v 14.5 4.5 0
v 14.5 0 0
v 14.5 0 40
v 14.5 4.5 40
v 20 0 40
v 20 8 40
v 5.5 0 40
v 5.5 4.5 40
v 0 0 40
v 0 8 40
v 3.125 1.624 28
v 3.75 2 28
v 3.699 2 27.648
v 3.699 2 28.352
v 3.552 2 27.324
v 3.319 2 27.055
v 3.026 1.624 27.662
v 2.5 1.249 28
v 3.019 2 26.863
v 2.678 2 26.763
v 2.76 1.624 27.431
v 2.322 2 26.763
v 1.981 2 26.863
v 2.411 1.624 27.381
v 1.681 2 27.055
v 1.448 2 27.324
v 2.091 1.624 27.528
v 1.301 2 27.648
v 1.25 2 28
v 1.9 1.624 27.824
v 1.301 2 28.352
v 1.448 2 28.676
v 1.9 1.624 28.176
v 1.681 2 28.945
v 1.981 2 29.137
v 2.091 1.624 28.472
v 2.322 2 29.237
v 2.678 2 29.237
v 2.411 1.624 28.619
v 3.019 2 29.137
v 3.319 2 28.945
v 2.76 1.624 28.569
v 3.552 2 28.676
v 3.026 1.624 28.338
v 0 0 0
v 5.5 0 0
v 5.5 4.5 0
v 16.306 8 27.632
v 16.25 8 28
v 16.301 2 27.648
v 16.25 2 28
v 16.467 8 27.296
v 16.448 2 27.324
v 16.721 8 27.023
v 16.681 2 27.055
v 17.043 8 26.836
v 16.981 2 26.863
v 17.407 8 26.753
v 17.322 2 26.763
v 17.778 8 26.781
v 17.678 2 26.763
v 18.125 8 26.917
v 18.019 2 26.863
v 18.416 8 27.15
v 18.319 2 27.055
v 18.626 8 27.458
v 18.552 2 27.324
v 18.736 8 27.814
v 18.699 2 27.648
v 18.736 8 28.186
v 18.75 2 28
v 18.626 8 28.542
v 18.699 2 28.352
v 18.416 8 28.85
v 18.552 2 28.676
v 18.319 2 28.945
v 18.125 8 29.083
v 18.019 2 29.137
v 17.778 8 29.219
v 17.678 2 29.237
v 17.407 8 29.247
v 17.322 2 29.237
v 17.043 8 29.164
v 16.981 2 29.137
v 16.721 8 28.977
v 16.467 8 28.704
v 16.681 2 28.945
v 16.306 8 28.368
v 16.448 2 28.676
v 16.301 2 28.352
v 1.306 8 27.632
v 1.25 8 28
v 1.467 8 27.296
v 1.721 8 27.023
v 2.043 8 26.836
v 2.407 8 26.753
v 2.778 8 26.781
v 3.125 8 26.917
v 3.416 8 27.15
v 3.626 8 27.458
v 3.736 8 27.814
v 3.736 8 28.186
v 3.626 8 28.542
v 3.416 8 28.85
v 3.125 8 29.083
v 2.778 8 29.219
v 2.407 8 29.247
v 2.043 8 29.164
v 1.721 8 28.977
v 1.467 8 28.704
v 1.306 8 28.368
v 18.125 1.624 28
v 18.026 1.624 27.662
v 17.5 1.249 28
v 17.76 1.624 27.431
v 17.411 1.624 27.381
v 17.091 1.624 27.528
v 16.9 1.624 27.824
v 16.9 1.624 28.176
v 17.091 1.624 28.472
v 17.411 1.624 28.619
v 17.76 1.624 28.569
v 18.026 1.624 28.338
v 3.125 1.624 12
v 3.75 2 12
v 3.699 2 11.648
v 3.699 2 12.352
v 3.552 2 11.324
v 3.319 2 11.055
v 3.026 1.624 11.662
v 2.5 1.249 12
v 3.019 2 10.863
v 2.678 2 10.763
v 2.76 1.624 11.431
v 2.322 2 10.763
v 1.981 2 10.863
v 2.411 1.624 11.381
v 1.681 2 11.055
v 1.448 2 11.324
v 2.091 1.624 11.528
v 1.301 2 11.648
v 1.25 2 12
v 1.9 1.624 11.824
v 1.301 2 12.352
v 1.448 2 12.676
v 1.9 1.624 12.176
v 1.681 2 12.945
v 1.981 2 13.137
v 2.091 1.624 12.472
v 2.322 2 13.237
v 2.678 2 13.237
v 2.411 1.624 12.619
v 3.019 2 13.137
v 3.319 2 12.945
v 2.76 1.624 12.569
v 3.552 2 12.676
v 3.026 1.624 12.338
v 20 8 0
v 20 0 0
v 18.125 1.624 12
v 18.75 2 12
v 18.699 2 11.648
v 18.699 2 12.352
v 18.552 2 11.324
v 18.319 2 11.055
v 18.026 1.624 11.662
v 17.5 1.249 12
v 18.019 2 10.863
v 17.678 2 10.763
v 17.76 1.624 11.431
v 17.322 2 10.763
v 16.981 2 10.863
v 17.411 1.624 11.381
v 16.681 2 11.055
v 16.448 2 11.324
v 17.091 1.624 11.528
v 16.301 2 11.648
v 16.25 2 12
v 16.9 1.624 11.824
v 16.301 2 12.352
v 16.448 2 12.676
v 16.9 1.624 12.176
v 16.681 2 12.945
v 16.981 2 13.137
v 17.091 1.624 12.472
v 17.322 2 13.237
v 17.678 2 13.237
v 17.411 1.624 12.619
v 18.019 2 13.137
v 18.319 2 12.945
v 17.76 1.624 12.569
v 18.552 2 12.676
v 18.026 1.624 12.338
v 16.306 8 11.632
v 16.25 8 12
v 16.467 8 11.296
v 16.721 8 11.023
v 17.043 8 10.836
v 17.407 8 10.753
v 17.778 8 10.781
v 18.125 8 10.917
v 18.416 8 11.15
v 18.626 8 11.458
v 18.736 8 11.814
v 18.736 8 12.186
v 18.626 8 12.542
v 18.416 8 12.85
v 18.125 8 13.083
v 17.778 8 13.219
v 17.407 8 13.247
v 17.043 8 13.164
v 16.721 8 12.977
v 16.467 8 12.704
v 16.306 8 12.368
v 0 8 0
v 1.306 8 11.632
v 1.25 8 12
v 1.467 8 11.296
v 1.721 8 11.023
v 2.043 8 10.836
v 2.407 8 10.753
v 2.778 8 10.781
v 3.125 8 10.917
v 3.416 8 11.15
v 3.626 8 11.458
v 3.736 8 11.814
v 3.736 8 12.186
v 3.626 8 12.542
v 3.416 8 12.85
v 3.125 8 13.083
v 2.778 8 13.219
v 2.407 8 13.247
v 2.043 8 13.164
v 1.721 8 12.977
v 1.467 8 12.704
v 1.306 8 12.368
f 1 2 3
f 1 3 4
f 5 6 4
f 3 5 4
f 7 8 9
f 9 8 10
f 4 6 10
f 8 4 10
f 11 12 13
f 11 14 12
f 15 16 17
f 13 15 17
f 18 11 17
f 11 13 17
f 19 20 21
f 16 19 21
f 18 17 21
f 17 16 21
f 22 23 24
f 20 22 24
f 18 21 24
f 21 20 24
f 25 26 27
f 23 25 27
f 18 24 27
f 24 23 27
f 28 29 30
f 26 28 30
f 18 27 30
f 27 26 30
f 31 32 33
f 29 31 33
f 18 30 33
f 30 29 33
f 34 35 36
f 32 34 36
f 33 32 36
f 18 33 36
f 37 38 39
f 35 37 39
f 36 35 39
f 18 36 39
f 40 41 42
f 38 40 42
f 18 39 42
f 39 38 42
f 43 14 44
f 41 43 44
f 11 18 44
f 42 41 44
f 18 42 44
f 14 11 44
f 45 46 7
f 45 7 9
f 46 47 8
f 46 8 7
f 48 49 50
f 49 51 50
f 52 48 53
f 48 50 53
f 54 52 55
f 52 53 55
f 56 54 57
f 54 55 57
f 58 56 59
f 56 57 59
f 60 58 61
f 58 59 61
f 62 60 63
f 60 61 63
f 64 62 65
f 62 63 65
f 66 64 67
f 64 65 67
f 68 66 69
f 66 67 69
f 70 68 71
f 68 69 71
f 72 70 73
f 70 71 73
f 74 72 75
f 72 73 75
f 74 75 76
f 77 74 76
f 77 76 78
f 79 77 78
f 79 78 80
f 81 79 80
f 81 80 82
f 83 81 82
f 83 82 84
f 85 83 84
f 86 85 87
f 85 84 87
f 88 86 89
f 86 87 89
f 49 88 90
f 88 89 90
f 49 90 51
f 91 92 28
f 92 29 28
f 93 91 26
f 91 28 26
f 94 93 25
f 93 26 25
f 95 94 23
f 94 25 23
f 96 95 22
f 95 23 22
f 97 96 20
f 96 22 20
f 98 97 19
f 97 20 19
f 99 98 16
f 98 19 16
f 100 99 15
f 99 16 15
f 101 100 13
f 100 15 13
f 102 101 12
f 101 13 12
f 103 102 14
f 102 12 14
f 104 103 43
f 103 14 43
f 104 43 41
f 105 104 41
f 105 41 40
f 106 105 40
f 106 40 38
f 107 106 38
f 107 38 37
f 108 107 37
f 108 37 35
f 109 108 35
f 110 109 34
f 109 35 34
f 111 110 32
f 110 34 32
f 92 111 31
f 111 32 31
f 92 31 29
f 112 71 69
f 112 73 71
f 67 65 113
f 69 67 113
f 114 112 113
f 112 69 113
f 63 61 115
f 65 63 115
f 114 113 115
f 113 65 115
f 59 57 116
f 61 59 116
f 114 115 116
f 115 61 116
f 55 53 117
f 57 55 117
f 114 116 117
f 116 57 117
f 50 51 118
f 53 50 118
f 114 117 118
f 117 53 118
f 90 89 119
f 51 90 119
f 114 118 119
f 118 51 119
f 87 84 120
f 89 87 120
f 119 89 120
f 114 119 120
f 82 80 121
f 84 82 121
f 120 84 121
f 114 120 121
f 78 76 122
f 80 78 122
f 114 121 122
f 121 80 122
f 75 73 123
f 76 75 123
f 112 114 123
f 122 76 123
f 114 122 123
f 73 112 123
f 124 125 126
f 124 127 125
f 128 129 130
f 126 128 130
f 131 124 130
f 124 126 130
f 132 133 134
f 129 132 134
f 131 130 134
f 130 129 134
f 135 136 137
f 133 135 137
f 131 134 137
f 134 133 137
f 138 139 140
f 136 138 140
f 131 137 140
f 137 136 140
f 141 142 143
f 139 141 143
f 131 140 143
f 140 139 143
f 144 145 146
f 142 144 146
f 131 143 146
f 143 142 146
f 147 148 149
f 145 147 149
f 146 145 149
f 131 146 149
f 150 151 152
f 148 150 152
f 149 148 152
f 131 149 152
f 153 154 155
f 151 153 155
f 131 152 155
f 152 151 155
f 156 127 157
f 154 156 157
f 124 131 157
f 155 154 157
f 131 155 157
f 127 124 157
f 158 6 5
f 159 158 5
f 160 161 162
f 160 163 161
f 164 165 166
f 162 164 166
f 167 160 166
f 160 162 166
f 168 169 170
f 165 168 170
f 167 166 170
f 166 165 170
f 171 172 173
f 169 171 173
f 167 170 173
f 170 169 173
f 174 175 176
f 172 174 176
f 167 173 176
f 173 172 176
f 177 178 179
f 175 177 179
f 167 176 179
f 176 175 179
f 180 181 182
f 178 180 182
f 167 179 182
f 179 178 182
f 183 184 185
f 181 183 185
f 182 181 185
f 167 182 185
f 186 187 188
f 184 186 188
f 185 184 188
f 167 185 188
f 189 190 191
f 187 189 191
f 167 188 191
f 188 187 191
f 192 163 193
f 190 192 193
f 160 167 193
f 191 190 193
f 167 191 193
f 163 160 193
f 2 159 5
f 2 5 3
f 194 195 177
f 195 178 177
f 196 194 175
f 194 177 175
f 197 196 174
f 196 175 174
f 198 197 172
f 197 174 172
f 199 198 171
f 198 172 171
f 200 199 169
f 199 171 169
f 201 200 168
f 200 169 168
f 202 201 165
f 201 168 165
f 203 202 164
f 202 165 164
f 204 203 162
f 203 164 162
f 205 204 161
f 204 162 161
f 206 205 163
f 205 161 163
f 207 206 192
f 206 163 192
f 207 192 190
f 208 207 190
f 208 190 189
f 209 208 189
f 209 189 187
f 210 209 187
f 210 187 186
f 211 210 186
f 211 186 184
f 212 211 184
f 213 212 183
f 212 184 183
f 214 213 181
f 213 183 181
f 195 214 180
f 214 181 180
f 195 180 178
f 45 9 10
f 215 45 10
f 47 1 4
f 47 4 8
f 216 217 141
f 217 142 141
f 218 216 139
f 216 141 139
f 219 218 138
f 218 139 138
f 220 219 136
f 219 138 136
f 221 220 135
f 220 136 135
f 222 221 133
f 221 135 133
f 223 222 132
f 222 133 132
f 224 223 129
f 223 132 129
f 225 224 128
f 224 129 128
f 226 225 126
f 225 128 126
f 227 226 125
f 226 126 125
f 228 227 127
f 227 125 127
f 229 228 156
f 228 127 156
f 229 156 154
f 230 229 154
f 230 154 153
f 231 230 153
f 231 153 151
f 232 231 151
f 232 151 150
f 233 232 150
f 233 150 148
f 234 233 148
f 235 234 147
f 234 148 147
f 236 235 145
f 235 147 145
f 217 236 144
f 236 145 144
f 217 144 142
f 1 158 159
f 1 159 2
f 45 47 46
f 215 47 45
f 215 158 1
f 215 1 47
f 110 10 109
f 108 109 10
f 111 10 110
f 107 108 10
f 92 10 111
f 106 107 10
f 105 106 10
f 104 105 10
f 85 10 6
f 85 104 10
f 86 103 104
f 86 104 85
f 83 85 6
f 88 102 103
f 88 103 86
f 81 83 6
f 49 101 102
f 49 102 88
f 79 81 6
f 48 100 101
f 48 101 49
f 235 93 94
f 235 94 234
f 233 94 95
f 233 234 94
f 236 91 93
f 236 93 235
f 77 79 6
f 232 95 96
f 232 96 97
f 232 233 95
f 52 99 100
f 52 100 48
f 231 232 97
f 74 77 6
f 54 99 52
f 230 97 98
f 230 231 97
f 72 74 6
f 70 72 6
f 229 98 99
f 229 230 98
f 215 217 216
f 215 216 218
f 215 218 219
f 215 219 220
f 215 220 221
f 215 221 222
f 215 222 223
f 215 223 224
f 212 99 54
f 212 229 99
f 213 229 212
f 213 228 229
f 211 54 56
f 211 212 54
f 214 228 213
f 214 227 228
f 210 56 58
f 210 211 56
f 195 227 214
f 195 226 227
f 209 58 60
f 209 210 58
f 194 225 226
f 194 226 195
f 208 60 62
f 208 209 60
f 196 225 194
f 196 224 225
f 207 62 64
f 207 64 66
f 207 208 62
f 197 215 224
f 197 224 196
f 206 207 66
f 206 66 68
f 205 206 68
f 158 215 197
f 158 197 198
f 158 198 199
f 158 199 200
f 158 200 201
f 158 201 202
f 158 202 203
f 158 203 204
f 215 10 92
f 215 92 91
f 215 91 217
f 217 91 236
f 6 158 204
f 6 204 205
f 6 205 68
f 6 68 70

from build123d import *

# Parameters (mm, degrees)
BOSS_EXTRUDE1_DEPTH       = 40
M3X0_5_TAPPED_HOLE1_D     = 2.5
M3X0_5_TAPPED_HOLE1_DEPTH = 6
M3X0_5_TAPPED_HOLE1_TIP   = 0.751075774


with BuildPart() as part:
    # Sketch2 → Boss-Extrude1 (new body)
    with BuildSketch(Plane.XY):
        Polygon((0, 0), (0, 8), (20, 8), (20, 0), (14.5, 0), (14.5, 4.5), (5.5, 4.5), (5.5, 0), align=None)
    extrude(amount=BOSS_EXTRUDE1_DEPTH)

    # M3x0.5 Tapped Hole1
    with Locations(Plane(origin=(0, 8, 0), x_dir=(1, 0, 0), z_dir=(0, 1, 0))):
        with Locations((2.5, -28), (2.5, -12), (17.5, -28), (17.5, -12)):
            Hole(M3X0_5_TAPPED_HOLE1_D / 2, depth=M3X0_5_TAPPED_HOLE1_DEPTH)
            with Locations((0, 0, -(M3X0_5_TAPPED_HOLE1_DEPTH + M3X0_5_TAPPED_HOLE1_TIP / 2))):  # 118° drill point
                Cone(0, M3X0_5_TAPPED_HOLE1_D / 2, M3X0_5_TAPPED_HOLE1_TIP, mode=Mode.SUBTRACT)


solid = part.part
